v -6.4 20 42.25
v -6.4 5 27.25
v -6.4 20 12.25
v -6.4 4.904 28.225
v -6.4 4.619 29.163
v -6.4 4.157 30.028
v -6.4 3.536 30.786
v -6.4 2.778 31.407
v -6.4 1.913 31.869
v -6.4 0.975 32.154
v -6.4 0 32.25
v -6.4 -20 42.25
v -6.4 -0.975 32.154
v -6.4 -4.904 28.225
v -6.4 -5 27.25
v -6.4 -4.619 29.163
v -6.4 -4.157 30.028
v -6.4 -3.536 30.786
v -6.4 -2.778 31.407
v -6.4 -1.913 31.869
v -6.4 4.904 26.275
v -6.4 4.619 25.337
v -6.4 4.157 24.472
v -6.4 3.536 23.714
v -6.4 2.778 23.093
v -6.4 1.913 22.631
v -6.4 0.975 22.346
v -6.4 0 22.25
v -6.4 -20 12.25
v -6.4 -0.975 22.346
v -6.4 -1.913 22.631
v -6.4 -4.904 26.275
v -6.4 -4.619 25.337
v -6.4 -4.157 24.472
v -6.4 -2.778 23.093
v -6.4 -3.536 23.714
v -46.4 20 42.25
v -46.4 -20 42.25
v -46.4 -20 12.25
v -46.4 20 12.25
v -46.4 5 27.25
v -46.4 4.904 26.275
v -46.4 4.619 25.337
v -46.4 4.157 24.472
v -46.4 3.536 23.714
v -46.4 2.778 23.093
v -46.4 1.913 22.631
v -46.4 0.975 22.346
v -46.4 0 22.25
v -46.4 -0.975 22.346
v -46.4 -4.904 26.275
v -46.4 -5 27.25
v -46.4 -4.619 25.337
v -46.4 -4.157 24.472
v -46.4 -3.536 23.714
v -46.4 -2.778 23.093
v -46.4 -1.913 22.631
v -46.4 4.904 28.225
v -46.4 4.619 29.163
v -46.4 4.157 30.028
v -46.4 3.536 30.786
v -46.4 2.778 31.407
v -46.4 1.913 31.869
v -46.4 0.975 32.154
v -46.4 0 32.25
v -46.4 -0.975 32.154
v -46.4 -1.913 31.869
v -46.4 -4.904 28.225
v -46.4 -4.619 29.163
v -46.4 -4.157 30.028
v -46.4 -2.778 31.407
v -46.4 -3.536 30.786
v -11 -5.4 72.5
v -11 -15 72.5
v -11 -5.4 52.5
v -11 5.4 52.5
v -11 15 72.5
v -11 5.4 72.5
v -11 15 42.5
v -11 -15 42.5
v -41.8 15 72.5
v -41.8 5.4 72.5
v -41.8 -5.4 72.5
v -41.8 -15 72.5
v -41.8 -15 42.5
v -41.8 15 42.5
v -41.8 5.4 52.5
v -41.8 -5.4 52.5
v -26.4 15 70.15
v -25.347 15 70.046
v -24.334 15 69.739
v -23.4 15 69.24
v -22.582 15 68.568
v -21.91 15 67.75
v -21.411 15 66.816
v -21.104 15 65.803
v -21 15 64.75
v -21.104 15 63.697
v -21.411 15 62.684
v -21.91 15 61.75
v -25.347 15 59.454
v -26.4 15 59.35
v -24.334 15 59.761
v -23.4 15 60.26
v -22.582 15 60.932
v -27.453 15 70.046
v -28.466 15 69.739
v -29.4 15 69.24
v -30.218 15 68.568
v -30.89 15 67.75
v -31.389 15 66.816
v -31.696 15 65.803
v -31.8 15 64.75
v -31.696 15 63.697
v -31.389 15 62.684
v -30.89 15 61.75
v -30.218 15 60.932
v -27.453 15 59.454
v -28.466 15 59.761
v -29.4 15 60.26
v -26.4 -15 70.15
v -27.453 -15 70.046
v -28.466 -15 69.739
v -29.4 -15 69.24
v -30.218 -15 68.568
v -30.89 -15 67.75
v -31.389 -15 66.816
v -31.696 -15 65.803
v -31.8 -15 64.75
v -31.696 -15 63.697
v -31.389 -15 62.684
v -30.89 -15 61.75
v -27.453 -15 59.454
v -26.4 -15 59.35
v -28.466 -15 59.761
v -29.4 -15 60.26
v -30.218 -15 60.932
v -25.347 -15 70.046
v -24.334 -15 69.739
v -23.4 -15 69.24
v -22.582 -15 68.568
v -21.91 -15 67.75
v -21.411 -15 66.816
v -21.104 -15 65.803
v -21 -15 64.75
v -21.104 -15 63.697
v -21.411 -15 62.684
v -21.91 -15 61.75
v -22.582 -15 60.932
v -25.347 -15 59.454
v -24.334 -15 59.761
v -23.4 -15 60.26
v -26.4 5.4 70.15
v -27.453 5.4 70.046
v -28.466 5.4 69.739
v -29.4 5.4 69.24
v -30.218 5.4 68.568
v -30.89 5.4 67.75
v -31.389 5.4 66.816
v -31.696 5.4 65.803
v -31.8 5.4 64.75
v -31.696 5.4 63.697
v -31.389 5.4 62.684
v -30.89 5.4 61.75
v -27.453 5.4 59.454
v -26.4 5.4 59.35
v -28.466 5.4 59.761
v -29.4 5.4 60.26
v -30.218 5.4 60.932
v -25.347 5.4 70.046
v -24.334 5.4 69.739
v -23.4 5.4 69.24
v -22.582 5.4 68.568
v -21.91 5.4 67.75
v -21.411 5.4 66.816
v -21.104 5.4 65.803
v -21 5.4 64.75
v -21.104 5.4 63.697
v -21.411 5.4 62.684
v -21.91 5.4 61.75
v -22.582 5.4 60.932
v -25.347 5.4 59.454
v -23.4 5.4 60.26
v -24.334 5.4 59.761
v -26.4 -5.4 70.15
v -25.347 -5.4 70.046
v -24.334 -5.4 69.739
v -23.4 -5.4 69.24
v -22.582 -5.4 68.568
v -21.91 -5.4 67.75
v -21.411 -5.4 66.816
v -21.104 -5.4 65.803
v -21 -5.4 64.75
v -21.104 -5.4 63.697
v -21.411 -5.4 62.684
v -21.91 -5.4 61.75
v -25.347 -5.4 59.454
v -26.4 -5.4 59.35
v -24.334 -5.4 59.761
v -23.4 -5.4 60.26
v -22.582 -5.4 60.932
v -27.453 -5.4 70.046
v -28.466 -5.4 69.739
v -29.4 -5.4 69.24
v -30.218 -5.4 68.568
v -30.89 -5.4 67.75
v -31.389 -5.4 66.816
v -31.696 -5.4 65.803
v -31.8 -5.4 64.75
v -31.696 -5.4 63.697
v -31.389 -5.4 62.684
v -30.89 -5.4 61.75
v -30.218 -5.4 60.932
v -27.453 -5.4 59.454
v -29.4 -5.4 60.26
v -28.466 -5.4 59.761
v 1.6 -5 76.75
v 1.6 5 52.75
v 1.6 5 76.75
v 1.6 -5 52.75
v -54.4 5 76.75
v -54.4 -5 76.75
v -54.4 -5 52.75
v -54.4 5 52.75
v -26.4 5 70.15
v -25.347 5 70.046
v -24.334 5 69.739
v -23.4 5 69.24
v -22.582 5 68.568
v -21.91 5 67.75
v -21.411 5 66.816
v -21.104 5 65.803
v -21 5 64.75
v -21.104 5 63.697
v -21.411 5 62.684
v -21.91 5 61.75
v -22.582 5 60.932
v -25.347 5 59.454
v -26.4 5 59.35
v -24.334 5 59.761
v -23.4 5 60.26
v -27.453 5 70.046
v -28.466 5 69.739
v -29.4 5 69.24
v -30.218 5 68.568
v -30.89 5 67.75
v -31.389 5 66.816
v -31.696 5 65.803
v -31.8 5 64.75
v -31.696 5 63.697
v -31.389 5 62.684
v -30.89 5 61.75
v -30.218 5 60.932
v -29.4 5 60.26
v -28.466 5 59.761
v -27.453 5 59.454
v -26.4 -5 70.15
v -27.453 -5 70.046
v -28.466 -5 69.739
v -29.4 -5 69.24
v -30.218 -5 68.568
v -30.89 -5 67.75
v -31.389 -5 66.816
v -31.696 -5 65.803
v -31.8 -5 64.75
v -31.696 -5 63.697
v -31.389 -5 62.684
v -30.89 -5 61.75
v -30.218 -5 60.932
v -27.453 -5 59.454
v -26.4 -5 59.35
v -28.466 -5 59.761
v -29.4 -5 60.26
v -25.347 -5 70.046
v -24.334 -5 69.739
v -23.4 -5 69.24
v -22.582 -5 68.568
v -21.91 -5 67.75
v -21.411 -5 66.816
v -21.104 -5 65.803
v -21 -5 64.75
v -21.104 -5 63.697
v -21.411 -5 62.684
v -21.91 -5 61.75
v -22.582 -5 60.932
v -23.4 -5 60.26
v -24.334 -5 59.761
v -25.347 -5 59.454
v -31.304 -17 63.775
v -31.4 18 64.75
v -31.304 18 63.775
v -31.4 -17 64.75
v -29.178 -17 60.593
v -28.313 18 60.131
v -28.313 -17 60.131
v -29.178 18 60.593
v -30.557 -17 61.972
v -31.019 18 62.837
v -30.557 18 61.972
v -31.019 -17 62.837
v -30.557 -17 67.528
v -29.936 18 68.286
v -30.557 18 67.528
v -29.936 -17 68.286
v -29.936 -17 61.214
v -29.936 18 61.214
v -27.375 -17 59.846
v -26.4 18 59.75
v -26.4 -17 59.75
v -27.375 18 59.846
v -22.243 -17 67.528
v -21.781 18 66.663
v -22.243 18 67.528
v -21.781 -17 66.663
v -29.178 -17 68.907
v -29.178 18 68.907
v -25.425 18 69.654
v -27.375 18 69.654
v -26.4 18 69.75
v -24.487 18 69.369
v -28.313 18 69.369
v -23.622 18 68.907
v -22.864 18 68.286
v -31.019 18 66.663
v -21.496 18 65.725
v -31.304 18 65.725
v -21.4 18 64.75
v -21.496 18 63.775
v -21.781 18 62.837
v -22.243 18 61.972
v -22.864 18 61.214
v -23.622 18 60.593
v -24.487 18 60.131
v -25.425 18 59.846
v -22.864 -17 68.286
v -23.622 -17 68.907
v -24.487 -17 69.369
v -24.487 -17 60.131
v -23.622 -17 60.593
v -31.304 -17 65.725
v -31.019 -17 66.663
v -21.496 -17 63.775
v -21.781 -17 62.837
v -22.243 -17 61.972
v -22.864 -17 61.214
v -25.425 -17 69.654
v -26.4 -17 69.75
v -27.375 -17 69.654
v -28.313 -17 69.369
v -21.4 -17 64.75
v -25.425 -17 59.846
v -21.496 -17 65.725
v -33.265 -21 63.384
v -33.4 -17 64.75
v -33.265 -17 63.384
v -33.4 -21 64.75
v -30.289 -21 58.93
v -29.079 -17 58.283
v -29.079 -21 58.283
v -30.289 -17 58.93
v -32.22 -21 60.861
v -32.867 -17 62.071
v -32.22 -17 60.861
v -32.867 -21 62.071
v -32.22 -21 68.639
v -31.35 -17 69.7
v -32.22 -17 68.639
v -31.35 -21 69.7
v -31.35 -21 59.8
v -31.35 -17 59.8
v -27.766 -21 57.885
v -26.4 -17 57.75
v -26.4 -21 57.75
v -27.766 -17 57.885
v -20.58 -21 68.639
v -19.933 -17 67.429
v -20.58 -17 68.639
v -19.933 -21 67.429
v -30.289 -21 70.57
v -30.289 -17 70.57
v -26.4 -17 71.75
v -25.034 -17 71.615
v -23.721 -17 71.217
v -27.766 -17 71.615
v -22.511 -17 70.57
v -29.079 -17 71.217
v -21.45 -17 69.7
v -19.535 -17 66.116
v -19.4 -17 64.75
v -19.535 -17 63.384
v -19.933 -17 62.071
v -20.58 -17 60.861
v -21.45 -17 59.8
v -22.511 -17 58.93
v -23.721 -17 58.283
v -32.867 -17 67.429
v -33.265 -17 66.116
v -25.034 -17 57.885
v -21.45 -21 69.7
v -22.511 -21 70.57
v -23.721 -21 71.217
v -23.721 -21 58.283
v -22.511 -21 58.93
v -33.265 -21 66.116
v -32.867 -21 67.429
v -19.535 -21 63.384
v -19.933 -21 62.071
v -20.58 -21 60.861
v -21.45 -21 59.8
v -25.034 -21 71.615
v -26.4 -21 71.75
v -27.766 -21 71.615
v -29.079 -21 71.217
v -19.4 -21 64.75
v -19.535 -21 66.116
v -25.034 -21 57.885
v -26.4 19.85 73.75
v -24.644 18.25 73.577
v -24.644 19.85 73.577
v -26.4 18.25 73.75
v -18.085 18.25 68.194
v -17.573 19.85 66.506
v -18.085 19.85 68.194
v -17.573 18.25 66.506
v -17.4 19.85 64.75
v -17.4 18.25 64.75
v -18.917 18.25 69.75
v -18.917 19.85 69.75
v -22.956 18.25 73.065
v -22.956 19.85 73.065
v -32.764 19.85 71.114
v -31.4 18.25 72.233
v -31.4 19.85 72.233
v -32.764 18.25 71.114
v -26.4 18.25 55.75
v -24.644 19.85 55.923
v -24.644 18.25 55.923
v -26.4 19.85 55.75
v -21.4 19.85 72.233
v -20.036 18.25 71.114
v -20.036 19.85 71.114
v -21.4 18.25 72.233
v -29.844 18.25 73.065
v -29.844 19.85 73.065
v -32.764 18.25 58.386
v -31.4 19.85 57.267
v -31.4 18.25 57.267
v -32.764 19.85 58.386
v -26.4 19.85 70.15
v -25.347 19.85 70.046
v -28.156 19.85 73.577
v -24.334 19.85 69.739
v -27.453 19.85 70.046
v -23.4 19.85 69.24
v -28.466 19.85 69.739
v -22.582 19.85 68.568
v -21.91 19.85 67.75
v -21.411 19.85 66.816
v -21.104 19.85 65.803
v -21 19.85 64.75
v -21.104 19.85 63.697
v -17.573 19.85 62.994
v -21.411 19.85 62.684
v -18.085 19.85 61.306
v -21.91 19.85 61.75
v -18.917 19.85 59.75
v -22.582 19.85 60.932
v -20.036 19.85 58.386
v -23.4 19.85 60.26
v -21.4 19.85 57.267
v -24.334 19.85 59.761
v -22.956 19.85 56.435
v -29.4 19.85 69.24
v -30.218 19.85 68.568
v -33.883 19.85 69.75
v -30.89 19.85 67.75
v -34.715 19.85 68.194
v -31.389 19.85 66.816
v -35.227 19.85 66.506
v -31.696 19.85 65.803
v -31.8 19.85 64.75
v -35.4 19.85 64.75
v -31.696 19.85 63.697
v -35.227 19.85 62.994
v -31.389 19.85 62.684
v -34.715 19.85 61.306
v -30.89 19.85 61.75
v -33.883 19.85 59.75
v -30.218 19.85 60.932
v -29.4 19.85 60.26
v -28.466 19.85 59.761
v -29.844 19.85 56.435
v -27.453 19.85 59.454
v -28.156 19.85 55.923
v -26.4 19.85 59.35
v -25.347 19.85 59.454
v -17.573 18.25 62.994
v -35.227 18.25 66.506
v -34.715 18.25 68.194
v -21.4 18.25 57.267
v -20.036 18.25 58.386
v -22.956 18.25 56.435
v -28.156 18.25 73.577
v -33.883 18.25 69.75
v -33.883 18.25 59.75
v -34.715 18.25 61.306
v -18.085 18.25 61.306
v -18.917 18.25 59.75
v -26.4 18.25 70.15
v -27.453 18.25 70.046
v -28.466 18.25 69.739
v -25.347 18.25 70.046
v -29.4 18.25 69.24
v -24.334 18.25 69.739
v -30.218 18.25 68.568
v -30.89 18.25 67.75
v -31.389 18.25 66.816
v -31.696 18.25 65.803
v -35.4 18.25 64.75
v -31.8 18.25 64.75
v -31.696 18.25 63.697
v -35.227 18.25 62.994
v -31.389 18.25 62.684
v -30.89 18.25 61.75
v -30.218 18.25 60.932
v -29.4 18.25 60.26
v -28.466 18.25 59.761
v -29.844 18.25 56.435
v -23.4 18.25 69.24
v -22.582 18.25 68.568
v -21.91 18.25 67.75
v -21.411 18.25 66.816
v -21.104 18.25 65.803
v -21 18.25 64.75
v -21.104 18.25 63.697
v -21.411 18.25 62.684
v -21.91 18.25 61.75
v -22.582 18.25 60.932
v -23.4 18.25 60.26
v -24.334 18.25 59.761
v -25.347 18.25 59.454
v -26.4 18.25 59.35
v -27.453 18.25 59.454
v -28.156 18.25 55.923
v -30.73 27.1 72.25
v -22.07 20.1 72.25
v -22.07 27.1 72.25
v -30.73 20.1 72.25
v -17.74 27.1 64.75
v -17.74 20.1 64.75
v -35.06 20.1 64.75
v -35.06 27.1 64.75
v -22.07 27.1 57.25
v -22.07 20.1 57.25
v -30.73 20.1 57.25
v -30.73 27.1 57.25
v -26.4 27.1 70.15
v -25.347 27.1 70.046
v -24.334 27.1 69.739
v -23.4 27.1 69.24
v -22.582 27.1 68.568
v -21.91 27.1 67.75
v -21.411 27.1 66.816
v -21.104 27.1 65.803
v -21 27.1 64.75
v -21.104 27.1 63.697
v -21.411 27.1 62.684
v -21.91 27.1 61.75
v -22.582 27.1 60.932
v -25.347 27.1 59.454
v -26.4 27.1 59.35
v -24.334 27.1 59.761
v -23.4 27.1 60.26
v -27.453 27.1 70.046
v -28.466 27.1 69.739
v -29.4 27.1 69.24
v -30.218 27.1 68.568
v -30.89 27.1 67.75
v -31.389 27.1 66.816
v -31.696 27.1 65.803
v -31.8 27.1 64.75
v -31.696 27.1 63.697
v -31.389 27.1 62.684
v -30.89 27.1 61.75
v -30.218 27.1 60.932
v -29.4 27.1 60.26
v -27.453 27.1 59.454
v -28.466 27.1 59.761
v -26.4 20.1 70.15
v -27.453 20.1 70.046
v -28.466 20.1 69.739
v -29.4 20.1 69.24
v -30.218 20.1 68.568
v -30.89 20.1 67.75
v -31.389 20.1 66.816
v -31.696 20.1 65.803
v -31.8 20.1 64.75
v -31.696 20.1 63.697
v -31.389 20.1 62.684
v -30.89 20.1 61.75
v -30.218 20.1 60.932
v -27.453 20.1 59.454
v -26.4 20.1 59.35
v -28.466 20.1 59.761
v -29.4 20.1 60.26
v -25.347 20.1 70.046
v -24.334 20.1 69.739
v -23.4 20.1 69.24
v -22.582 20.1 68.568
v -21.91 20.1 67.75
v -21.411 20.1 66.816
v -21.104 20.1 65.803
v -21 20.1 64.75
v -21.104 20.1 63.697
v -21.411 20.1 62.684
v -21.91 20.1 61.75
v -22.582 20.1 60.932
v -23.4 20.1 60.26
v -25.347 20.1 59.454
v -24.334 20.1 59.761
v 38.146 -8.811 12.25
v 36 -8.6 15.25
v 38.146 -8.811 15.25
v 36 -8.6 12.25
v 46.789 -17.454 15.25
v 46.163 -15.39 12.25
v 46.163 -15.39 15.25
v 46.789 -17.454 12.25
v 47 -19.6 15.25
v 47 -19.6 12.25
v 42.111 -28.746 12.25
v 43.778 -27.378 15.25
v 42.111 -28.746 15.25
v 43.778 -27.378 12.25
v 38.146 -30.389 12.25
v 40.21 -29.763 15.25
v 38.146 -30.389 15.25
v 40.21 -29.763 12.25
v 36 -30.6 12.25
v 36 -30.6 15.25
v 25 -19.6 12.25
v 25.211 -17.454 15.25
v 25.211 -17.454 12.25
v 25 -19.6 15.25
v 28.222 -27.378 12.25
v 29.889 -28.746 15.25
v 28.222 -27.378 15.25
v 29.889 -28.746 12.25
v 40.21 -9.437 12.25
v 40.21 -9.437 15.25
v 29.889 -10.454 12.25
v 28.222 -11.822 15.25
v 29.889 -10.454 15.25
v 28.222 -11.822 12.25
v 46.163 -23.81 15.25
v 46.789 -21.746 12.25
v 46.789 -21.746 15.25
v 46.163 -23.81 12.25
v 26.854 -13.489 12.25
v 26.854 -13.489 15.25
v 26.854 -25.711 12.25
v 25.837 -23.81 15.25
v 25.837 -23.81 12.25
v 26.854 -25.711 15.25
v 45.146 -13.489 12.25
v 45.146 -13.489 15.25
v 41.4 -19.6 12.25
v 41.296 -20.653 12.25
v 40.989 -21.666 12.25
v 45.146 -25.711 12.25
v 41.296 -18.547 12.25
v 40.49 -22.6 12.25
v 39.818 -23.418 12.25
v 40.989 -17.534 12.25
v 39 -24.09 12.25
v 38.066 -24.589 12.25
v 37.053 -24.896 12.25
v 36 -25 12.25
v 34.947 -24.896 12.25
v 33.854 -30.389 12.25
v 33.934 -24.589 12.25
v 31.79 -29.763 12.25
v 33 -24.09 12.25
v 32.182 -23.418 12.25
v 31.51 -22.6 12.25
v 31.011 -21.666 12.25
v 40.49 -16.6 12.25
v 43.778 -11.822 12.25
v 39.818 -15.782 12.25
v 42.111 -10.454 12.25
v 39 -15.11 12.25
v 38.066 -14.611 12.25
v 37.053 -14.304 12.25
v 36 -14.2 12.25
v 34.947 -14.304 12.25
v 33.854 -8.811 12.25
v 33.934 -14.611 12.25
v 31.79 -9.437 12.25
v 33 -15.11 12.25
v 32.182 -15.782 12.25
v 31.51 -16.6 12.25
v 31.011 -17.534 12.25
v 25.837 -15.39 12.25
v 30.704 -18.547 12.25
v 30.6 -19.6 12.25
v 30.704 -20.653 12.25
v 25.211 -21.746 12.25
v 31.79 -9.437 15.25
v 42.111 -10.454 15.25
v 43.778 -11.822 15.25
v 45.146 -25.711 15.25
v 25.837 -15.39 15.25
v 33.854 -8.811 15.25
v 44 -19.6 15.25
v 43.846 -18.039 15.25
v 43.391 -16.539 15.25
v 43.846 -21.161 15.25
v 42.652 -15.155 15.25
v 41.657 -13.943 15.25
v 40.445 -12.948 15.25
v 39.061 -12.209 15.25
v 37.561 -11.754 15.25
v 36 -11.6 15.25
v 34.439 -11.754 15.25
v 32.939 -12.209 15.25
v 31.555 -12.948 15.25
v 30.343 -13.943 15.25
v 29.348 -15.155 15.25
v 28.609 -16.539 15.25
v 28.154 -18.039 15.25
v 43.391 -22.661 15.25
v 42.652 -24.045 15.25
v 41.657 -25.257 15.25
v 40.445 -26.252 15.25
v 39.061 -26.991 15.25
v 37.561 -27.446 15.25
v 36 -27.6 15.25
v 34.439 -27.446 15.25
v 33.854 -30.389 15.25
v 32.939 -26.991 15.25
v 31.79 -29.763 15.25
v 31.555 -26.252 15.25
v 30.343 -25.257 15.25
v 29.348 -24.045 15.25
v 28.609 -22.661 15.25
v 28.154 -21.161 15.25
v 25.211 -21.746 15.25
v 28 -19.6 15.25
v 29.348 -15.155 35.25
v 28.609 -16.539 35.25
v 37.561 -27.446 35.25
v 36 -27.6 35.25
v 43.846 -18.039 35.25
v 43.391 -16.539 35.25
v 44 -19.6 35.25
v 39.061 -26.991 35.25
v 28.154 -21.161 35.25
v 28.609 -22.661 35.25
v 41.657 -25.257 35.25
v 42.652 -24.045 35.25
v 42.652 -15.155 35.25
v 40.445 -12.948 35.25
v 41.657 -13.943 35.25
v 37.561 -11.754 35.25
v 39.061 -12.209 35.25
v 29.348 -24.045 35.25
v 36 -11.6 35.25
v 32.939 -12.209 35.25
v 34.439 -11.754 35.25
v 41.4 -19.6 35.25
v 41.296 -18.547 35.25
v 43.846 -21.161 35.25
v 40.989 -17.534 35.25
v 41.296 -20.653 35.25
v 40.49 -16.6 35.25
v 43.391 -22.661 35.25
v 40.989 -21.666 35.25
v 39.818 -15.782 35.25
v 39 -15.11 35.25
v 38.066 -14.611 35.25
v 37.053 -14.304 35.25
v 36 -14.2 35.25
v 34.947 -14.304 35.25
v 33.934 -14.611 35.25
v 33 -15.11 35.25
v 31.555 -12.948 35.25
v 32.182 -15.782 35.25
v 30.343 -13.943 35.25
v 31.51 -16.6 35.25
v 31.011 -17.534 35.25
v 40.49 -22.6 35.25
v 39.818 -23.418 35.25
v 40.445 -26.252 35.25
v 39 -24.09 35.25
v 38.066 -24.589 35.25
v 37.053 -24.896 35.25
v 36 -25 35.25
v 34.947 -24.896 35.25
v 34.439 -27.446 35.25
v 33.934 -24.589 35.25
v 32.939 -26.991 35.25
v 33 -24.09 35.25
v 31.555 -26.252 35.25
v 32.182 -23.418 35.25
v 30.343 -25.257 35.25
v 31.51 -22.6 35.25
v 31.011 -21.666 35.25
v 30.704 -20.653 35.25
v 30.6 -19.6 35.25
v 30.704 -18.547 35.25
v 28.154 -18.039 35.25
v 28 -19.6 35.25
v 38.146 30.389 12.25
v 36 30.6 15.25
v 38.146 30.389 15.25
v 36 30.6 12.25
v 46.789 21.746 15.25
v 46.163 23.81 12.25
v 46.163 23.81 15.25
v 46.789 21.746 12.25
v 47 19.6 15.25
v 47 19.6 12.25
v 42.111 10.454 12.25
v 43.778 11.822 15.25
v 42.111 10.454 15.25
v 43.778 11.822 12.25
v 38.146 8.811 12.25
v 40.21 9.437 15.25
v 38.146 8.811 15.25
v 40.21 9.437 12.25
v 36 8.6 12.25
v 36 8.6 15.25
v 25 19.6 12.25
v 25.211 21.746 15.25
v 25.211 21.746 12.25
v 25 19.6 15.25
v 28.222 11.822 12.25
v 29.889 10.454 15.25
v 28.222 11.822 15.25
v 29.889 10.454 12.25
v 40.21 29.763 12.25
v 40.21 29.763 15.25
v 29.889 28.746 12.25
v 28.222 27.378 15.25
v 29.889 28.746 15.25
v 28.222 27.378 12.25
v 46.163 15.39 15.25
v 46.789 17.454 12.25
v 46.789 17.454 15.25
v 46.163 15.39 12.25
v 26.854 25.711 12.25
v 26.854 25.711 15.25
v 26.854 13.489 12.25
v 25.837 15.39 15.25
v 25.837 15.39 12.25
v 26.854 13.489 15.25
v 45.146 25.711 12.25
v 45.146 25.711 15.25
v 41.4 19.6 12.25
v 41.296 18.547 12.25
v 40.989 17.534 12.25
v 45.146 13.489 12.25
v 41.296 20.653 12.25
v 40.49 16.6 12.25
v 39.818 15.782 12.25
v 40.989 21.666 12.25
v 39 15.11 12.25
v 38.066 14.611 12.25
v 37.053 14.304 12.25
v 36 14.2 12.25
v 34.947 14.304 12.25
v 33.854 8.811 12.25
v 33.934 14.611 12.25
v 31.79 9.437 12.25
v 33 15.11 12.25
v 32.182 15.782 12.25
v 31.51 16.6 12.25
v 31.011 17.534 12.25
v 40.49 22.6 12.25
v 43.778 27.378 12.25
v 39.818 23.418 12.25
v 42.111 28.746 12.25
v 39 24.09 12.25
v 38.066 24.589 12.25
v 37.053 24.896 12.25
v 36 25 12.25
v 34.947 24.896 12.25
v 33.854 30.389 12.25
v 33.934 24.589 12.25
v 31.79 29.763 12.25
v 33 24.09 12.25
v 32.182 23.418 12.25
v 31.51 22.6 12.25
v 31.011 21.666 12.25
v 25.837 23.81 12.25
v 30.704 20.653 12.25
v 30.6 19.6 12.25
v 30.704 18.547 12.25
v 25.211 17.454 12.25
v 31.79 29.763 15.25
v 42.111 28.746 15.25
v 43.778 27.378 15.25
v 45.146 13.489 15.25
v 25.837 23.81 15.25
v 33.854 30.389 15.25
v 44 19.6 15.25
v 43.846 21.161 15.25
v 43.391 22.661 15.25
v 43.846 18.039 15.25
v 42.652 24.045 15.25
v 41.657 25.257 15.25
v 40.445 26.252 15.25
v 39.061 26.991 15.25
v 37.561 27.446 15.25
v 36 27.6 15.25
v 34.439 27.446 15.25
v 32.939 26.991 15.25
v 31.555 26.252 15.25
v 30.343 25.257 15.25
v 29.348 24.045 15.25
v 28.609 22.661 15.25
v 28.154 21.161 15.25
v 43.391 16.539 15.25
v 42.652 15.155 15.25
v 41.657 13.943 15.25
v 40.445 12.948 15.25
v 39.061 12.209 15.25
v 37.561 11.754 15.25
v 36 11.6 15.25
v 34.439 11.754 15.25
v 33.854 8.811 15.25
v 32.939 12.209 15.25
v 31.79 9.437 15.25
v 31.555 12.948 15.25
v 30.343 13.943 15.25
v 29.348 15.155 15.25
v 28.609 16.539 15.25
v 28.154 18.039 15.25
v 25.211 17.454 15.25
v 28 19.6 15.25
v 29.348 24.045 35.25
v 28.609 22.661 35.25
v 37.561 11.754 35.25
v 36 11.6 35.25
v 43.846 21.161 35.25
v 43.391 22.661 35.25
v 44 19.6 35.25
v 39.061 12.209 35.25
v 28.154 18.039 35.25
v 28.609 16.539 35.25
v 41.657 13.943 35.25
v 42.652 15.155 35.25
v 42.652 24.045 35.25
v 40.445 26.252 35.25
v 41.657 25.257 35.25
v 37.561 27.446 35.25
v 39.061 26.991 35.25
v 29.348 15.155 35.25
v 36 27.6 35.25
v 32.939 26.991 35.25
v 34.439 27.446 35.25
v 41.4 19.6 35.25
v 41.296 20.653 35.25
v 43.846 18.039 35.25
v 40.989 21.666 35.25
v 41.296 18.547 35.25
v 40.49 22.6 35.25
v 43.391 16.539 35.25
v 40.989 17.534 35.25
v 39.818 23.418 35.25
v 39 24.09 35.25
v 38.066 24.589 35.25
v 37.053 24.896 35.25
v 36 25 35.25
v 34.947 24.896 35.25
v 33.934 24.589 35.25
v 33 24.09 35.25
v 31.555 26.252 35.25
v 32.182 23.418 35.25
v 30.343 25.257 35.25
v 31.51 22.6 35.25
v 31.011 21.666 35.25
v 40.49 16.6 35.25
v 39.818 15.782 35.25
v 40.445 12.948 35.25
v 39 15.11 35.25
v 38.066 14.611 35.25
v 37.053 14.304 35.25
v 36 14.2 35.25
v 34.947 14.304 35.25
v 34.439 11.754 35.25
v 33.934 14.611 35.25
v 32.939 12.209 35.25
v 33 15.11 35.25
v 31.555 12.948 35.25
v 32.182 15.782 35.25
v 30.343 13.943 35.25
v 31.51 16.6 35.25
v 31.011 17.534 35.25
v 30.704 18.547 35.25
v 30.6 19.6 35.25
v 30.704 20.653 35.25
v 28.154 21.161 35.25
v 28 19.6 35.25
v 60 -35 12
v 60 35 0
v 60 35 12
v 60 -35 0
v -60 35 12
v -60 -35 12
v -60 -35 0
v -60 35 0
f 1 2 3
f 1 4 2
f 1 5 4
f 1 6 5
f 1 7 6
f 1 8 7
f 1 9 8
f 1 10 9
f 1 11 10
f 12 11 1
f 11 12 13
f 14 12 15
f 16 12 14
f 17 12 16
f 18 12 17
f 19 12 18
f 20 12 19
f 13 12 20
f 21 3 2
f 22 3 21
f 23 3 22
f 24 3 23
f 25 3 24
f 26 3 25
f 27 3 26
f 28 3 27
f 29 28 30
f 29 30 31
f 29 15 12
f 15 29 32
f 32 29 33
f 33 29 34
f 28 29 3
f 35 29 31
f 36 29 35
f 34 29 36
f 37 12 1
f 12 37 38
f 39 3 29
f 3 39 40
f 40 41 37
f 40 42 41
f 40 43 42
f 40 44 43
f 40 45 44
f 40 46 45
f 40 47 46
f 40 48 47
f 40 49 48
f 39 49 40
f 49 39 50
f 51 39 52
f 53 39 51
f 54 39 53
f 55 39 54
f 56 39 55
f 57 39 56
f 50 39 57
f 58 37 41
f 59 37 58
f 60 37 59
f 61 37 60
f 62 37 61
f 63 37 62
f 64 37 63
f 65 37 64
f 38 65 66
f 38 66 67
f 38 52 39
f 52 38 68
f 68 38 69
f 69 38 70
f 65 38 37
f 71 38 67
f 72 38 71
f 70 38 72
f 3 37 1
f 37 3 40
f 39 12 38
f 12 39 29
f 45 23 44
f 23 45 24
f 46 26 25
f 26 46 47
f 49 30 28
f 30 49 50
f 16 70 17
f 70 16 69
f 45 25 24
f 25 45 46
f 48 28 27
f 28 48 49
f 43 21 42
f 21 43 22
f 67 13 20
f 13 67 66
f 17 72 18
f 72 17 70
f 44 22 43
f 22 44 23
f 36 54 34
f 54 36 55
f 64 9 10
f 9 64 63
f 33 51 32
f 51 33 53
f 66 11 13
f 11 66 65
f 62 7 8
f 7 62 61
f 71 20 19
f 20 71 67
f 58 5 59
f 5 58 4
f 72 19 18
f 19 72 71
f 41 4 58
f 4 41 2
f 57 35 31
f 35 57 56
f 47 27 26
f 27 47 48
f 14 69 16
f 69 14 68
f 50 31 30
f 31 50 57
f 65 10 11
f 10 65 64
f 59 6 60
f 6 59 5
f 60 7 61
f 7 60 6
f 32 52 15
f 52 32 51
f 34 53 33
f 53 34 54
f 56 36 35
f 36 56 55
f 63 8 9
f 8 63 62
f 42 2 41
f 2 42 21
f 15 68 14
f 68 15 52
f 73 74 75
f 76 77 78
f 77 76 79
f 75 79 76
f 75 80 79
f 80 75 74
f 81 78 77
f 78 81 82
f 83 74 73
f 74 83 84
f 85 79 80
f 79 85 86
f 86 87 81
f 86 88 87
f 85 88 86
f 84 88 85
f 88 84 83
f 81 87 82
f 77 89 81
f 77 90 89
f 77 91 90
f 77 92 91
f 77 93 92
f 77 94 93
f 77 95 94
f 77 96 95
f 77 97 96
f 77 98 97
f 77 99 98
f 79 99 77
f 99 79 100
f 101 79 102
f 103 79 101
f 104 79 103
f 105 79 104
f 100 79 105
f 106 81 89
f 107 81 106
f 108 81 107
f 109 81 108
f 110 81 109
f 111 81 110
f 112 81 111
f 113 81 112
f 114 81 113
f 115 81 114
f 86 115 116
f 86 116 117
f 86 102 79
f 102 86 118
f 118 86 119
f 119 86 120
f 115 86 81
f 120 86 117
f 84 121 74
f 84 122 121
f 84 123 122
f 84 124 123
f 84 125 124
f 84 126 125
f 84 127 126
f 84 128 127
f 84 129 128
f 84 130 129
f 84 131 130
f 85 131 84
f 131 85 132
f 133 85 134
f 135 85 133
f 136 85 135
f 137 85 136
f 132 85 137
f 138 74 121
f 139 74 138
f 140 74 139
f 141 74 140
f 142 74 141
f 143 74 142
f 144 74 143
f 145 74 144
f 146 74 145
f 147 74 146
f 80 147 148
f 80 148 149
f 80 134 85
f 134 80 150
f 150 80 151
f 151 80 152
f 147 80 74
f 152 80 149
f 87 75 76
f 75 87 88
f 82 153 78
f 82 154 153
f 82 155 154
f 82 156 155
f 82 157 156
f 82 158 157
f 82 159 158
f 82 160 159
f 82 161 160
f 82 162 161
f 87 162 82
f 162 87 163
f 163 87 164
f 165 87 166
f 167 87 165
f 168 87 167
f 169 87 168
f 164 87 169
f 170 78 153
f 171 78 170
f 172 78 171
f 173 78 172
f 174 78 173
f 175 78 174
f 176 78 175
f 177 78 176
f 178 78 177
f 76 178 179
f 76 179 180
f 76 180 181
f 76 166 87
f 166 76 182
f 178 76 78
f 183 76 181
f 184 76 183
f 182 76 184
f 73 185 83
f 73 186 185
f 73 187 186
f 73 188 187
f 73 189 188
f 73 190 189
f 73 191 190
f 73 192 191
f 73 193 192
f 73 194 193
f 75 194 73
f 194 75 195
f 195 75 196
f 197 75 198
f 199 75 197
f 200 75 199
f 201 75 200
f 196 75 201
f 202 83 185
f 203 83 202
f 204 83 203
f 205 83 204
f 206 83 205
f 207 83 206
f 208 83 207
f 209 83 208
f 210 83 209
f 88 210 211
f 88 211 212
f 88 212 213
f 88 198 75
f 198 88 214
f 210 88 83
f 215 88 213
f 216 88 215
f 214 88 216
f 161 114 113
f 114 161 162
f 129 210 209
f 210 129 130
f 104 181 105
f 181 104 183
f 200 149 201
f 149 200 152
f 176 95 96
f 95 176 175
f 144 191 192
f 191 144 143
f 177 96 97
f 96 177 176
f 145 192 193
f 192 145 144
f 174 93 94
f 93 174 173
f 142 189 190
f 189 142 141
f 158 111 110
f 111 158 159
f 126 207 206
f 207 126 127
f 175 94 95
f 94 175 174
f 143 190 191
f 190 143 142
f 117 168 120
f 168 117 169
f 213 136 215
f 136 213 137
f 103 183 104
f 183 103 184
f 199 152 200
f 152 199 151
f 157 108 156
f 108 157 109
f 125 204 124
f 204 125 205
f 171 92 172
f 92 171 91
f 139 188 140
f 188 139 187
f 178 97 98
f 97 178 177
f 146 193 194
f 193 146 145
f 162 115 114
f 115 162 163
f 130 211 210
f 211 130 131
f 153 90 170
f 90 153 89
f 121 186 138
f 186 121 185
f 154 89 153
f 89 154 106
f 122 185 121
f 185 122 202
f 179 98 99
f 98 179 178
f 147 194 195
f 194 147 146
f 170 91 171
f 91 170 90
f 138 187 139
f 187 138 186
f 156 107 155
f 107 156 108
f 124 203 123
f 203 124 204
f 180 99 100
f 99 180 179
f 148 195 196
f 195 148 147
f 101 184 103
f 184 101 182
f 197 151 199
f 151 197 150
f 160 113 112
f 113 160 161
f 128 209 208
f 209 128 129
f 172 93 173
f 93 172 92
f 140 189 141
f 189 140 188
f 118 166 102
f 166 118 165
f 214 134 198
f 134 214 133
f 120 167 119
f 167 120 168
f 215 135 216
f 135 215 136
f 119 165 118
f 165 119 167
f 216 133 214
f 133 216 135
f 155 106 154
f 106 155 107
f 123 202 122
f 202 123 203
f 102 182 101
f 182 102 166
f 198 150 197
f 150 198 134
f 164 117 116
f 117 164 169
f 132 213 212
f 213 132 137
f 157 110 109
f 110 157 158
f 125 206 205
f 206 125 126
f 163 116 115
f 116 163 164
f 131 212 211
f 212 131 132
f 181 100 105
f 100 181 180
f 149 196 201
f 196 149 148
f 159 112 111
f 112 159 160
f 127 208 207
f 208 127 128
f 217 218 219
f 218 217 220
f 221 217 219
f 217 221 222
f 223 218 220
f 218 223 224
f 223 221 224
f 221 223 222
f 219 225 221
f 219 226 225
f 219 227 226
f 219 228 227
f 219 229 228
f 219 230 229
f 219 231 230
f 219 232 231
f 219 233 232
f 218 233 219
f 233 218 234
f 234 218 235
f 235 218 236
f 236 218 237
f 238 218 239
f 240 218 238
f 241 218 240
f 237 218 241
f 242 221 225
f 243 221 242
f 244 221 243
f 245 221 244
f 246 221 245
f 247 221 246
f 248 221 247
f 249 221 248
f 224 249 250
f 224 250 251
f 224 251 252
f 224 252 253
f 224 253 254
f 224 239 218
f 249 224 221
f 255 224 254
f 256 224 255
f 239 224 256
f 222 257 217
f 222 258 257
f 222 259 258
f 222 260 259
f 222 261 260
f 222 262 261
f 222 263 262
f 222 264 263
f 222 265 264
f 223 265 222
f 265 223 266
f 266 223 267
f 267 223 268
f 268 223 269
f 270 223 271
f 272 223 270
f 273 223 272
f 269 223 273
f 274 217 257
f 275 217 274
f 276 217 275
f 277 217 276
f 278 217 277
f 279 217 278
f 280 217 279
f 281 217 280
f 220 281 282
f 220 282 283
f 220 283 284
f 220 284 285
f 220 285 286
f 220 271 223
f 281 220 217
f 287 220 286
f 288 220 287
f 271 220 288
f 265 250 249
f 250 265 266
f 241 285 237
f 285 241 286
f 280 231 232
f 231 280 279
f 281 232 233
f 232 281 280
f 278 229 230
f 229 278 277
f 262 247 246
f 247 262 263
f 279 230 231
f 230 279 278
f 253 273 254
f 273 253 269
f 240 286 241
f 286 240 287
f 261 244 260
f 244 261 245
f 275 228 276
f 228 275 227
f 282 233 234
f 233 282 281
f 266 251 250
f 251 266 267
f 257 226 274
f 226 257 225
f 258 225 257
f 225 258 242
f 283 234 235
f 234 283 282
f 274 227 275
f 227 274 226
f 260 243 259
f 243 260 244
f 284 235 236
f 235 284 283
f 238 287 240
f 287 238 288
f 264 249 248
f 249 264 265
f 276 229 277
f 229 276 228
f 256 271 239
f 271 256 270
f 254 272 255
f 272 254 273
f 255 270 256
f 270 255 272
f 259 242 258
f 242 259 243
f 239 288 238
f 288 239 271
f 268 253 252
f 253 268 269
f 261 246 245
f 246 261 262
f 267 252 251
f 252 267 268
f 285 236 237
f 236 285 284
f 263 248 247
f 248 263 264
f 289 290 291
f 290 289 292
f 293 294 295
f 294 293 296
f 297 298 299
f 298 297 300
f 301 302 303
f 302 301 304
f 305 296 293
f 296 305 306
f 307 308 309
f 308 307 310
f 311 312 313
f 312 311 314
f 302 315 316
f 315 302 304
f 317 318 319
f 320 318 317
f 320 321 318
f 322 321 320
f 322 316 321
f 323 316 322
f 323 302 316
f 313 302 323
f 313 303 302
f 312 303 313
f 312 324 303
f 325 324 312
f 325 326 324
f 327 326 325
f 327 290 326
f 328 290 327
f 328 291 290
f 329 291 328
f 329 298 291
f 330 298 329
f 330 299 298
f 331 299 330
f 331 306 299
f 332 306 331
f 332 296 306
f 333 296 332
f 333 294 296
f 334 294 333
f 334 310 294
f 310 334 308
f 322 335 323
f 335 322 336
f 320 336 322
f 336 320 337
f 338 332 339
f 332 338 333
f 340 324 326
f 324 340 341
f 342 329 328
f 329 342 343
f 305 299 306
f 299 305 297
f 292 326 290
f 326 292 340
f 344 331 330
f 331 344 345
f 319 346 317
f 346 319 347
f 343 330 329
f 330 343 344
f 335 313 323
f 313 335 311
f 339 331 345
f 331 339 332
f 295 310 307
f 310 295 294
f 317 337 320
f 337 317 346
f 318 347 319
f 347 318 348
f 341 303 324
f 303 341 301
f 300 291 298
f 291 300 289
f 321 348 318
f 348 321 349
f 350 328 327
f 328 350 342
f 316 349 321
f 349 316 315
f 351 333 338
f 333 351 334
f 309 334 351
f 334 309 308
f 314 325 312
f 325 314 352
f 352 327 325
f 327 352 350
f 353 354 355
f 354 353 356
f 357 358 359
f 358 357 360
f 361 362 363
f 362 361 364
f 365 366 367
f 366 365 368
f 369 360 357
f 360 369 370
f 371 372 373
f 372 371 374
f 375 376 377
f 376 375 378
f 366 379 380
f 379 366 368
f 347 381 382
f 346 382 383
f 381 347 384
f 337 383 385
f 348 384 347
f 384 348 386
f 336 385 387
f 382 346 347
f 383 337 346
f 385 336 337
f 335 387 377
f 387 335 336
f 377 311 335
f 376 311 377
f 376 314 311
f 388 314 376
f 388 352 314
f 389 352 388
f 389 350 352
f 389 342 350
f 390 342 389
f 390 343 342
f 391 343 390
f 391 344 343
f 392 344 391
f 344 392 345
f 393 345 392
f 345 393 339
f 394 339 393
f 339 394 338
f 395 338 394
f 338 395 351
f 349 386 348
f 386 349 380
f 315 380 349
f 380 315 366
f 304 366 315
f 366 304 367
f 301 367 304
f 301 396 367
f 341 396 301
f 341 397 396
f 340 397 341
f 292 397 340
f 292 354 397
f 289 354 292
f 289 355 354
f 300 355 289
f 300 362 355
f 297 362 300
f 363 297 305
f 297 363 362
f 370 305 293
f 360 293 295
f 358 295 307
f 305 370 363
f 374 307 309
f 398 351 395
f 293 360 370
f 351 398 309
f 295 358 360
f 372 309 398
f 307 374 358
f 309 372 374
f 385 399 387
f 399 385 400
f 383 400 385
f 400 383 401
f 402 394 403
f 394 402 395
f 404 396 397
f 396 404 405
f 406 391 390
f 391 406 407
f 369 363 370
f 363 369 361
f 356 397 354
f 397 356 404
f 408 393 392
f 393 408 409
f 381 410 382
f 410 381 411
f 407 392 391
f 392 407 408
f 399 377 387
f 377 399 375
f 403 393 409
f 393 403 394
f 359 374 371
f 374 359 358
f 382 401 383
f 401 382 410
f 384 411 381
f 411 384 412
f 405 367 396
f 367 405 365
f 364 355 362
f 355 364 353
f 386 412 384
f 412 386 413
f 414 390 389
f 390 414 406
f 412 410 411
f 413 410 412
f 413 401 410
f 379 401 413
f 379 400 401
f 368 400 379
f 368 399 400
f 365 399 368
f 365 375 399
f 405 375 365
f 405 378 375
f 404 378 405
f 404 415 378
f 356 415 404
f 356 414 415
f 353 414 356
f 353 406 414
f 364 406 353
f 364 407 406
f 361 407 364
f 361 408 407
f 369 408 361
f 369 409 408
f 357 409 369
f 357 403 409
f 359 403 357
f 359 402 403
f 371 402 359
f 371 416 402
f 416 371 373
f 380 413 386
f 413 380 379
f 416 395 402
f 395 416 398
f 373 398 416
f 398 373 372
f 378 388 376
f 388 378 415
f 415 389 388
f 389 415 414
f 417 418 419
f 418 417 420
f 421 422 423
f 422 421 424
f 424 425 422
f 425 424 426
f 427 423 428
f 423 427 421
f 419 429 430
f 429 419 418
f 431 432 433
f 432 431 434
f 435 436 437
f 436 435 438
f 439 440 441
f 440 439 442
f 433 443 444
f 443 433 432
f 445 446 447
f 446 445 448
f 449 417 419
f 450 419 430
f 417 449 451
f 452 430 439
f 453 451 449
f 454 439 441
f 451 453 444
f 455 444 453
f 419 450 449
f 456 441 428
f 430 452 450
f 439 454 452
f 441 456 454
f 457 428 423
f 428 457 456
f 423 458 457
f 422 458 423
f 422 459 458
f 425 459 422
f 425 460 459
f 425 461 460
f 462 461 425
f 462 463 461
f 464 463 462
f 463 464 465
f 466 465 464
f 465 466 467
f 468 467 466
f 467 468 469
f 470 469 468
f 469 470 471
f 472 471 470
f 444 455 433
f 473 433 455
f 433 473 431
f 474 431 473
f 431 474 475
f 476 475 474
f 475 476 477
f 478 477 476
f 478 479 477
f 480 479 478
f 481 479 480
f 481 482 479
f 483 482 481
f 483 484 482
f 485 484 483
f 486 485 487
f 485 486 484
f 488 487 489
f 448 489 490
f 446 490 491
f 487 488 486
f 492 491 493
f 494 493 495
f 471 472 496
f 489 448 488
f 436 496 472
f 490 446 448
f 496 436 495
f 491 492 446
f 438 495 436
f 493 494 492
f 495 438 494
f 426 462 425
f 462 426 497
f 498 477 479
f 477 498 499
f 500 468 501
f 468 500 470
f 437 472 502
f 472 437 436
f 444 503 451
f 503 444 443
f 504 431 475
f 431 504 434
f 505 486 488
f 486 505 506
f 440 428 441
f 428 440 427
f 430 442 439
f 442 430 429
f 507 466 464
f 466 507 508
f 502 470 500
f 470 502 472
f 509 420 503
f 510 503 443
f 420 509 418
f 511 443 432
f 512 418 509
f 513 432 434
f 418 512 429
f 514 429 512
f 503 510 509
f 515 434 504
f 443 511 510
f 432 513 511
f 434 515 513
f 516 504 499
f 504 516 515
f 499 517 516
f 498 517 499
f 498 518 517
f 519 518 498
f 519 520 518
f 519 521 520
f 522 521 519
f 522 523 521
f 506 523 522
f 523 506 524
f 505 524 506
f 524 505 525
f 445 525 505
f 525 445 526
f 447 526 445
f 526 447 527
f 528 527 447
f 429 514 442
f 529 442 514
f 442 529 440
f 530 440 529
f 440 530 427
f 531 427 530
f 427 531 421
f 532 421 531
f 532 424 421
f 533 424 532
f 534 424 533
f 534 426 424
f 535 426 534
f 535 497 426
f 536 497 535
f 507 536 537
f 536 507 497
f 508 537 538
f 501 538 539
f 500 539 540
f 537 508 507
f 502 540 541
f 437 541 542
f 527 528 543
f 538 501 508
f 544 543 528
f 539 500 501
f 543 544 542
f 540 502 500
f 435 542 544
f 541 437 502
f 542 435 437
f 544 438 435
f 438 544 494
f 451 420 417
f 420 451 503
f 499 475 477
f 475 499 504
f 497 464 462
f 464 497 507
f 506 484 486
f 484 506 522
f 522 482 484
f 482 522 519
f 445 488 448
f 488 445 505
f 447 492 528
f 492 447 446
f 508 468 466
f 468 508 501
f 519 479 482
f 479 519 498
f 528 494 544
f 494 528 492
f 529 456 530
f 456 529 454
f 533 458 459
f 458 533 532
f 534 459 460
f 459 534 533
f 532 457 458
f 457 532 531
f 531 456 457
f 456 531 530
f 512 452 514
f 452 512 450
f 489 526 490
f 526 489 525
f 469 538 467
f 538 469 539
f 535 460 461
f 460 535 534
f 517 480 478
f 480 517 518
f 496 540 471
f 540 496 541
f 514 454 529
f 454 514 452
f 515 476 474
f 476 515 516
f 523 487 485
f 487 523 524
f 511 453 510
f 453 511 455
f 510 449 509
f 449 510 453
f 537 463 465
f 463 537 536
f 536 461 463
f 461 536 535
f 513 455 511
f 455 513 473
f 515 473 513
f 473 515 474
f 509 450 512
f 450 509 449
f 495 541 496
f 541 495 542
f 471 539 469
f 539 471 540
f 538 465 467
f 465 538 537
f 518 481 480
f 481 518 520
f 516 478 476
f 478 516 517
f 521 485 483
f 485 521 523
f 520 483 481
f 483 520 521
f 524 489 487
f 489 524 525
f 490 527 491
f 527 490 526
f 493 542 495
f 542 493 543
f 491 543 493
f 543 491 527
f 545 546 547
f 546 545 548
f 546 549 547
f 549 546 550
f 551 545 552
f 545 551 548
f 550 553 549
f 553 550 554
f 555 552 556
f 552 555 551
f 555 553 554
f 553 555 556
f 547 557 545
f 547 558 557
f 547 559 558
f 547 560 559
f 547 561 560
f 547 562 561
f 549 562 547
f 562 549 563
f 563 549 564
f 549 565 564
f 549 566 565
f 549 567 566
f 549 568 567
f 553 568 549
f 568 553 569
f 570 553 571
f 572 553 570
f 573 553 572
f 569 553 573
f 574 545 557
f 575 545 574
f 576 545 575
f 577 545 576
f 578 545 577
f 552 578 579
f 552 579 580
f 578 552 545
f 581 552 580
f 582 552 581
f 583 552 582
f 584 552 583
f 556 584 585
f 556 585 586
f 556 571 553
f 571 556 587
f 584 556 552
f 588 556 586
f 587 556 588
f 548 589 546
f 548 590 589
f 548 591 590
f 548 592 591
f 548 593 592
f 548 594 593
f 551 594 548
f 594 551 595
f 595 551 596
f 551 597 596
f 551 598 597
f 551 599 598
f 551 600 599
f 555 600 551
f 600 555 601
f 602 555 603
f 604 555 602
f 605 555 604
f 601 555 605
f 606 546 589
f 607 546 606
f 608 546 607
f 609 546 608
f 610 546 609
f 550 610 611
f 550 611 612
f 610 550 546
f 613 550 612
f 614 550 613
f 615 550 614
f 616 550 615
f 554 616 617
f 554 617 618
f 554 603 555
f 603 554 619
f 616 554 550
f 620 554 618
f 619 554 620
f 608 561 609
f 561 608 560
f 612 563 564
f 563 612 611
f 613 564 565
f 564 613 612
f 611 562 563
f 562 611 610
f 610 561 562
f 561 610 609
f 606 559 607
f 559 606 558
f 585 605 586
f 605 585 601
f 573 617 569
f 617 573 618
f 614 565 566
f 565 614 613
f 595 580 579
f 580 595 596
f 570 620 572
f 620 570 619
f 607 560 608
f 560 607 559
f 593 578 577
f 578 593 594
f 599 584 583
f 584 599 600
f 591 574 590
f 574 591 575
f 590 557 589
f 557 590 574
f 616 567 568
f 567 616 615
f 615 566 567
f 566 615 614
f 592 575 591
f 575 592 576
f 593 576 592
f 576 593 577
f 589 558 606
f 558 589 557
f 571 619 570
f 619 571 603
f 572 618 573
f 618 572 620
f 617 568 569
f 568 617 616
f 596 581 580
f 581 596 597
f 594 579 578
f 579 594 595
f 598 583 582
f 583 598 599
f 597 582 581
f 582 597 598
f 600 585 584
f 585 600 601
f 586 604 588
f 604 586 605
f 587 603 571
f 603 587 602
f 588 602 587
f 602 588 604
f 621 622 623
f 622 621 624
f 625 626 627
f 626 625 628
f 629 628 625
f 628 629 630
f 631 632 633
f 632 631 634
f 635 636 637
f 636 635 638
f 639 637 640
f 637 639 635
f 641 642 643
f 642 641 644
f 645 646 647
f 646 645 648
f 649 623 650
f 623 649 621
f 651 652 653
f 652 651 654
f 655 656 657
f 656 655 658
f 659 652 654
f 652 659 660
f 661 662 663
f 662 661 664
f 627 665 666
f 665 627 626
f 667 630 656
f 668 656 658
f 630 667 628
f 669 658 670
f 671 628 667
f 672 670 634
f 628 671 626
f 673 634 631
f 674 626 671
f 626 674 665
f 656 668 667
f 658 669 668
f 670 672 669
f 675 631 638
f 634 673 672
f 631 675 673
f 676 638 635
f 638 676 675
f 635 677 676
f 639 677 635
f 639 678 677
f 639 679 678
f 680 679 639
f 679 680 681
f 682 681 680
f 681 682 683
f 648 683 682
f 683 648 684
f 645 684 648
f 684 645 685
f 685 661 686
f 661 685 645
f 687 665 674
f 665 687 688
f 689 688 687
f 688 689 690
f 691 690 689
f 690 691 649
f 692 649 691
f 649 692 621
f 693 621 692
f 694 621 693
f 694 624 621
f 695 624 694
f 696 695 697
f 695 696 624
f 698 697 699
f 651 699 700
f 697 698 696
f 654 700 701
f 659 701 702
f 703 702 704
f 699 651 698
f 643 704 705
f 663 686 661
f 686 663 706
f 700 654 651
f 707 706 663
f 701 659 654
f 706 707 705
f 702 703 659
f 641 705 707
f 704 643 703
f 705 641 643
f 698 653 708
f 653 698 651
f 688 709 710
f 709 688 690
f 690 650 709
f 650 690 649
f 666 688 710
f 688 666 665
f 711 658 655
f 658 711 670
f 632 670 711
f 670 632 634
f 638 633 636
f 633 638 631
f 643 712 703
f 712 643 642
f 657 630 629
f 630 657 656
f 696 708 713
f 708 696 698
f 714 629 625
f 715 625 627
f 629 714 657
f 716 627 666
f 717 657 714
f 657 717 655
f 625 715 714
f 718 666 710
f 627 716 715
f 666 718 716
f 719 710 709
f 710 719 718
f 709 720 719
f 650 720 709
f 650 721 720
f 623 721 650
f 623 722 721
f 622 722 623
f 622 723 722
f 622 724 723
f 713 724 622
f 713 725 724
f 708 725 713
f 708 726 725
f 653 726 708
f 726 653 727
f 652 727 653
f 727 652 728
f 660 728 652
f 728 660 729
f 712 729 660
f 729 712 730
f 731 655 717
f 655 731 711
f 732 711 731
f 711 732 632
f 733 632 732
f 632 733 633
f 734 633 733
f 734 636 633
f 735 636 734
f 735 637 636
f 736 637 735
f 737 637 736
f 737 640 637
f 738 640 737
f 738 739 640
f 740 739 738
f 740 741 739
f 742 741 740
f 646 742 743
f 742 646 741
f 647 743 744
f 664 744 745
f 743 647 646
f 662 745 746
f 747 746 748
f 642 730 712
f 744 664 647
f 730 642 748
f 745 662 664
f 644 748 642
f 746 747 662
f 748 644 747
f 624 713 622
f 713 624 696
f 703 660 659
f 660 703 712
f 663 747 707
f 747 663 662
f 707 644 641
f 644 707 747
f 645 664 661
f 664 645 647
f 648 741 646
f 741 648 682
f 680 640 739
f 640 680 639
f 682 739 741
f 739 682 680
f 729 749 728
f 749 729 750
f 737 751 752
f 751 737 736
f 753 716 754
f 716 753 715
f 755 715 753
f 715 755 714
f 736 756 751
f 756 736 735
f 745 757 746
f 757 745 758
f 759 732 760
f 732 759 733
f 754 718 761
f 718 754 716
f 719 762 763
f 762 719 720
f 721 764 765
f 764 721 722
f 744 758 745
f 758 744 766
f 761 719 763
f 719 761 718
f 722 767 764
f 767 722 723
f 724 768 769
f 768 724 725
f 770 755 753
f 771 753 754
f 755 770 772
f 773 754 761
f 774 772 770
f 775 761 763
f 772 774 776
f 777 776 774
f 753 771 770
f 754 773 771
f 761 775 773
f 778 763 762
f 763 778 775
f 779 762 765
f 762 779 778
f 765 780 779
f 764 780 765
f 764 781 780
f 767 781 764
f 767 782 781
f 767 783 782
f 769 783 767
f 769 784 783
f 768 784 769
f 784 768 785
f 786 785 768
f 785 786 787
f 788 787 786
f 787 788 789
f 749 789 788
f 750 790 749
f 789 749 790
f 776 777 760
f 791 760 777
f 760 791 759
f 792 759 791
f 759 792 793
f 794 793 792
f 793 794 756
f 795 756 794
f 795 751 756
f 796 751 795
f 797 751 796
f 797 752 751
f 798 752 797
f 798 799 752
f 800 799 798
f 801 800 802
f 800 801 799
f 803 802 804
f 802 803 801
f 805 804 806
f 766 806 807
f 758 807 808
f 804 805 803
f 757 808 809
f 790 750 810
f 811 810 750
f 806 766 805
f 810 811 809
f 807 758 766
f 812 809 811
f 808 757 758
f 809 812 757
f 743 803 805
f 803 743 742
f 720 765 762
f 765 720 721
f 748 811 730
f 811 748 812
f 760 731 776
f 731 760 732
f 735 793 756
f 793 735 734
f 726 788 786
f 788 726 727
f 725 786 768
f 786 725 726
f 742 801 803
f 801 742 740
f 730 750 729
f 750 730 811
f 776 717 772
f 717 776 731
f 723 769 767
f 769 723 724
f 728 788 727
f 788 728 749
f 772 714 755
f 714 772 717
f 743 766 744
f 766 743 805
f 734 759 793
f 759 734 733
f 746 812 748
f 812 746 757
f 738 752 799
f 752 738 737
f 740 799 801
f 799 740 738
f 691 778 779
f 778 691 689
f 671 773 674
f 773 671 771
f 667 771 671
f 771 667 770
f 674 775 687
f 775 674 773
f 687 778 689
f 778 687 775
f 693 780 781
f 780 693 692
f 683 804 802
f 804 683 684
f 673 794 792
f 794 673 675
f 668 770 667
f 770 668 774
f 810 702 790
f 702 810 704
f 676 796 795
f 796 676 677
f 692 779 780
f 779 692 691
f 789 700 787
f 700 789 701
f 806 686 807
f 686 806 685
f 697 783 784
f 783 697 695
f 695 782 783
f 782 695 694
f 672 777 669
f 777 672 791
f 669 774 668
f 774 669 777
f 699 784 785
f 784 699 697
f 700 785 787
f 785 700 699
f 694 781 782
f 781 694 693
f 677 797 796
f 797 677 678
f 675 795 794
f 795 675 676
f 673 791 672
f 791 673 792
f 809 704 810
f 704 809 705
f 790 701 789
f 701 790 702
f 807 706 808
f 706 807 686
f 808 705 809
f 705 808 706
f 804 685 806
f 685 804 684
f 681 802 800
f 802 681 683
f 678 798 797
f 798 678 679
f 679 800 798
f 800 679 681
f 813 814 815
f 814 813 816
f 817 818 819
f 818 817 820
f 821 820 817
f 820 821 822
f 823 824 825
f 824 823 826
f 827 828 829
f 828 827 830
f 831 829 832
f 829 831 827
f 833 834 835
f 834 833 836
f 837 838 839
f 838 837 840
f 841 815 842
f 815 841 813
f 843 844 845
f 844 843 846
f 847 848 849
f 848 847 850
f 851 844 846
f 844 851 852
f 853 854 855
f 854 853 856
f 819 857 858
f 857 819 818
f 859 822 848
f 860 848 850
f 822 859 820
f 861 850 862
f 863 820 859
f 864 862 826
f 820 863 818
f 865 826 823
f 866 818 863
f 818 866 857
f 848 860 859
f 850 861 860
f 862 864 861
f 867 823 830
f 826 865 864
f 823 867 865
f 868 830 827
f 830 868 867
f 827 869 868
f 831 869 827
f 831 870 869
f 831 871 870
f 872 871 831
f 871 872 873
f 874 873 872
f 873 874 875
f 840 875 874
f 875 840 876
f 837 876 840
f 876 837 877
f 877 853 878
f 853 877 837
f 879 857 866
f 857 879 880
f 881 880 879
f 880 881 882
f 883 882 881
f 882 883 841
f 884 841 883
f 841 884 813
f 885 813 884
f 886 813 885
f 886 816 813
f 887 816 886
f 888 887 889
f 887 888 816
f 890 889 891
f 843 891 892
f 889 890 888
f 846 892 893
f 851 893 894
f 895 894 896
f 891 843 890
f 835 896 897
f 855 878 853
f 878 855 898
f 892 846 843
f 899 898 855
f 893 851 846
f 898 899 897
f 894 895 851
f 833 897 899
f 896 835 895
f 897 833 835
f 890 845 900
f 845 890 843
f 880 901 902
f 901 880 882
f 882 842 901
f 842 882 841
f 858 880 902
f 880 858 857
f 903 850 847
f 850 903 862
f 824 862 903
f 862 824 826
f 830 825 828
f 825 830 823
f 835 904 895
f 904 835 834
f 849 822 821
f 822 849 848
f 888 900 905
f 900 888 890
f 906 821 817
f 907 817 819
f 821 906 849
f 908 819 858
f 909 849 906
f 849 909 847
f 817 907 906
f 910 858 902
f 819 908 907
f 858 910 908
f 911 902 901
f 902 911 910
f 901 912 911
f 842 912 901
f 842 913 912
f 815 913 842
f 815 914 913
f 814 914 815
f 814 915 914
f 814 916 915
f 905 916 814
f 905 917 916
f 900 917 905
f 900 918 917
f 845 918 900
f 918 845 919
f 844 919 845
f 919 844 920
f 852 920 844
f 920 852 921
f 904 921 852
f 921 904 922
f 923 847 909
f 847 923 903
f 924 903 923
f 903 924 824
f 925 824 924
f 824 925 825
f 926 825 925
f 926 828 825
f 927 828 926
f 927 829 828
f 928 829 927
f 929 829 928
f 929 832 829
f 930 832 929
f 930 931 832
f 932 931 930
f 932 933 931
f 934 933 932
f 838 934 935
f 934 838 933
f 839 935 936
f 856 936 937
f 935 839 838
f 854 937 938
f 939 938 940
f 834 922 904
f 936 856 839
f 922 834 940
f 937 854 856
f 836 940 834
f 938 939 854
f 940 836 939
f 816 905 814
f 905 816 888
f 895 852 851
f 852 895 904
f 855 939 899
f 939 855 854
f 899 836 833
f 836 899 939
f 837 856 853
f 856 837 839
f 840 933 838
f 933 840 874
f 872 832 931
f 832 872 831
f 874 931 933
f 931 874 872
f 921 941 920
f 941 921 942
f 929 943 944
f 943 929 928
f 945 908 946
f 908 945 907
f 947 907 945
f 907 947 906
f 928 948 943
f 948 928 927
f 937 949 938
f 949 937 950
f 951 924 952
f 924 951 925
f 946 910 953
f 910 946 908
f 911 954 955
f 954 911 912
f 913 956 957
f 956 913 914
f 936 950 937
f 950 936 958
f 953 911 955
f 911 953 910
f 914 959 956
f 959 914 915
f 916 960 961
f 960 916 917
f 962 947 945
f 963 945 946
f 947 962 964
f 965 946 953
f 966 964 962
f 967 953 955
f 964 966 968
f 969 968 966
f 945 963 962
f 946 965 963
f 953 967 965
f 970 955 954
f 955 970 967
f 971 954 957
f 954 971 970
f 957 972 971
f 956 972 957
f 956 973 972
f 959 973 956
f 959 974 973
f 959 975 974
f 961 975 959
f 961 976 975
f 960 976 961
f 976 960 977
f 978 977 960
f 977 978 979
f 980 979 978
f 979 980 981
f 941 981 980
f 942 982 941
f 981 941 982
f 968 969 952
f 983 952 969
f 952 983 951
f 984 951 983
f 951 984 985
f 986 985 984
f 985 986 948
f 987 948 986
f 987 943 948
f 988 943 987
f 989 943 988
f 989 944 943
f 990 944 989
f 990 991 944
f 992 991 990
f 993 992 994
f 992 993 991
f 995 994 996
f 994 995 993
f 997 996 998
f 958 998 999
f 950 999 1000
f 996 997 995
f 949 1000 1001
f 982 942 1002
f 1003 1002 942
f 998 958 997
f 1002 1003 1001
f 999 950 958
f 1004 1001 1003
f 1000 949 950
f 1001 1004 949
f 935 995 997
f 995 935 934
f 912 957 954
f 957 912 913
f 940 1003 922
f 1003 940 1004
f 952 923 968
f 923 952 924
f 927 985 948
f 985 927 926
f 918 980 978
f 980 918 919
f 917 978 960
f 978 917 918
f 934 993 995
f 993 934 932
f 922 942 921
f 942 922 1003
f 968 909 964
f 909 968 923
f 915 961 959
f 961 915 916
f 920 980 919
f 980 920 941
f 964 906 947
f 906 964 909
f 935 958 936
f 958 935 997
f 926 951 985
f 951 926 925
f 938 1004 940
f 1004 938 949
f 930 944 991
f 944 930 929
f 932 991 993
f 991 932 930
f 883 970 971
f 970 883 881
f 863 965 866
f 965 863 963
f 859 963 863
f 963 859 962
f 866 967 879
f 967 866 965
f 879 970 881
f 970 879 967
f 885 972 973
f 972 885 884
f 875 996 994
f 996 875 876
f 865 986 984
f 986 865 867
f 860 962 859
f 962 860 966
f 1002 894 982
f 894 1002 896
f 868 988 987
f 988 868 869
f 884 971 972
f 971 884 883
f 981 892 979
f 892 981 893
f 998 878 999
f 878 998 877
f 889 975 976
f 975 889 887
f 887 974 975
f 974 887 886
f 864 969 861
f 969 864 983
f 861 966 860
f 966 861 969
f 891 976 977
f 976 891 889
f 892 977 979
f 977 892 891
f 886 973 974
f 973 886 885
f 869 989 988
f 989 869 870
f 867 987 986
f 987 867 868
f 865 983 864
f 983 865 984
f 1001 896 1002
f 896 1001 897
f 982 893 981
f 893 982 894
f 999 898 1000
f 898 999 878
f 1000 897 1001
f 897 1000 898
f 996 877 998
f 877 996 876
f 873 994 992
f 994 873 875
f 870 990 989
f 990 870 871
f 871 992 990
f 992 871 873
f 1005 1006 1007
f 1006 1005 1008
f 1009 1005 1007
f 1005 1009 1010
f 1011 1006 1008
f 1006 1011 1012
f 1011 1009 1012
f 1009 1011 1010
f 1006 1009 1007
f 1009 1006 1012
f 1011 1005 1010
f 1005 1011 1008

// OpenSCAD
$fn = 32;

// ------------------------------------------------------------------------
// Indexing jig: plate 120 x 70 mm, pin d10
// Every part is its own module, assembly() places every instance.
// ------------------------------------------------------------------------

// --- part 1 ---
module jig_plate() {
  difference() {
    translate([-60, -35, 0]) cube([120, 70, 12]);
  }
}

// --- part 2 ---
module locator_block() {
  difference() {
    translate([-20, -20, 0]) cube([40, 40, 30]);
    translate([0, 0, 15]) rotate([0, 90, 0]) cylinder(h = 42, d = 10, center = true);
  }
}

// --- part 3 ---
module index_fork() {
  difference() {
    translate([-15.4, -15, 0]) cube([30.8, 30, 30]);
    translate([-16.4, -5.4, 10]) cube([32.8, 10.8, 21]);
    translate([0, 0, 22.25]) rotate([90, 0, 0]) cylinder(h = 32, d = 10.8, center = true);
  }
}

// --- part 4 ---
module index_arm() {
  difference() {
    translate([-28, -5, 0]) cube([56, 10, 24]);
    translate([0, 0, 12]) rotate([90, 0, 0]) cylinder(h = 12, d = 10.8, center = true);
  }
}

// --- part 5 ---
module index_pin() {
  rotate([0, 90, 0]) cylinder(h = 36, d = 10, center = true);
  translate([-21, 0, 0]) rotate([0, 90, 0]) cylinder(h = 4, d = 14);
}

// --- part 6 ---
module pin_washer() {
  difference() {
      translate([0, 0, 0]) cylinder(h = 1.6, d = 18);
      translate([0, 0, -1]) cylinder(h = 3.6, d = 10.8);
    }
}

// --- part 7 ---
module lock_nut() {
  difference() {
    linear_extrude(height = 7) polygon(points = [[8.66, 0], [4.33, 7.5], [-4.33, 7.5], [-8.66, 0], [-4.33, -7.5], [4.33, -7.5]]);
    translate([0, 0, -1]) cylinder(h = 9, d = 10.8);
  }
}

// --- part 8 ---
module guide_bush_a() {
  difference() {
    union() {
      cylinder(h = 3, d = 22);
      translate([0, 0, 3]) cylinder(h = 20, d = 16);
    }
    translate([0, 0, -1]) cylinder(h = 25, d = 10.8);
  }
}

// --- part 9 ---
module guide_bush_b() {
  difference() {
    union() {
      cylinder(h = 3, d = 22);
      translate([0, 0, 3]) cylinder(h = 20, d = 16);
    }
    translate([0, 0, -1]) cylinder(h = 25, d = 10.8);
  }
}

// --- assembly ---
module assembly() {
  color([0.80, 0.24, 0.20]) translate([0, 0, 0]) rotate([0, 0, 0]) jig_plate();
  color([0.20, 0.45, 0.75]) translate([-26.4, 0, 12.25]) rotate([0, 0, 0]) locator_block();
  color([0.25, 0.62, 0.32]) translate([-26.4, 0, 42.5]) rotate([0, 0, 0]) index_fork();
  color([0.92, 0.70, 0.18]) translate([-26.4, 0, 52.75]) rotate([0, 0, 0]) index_arm();
  color([0.58, 0.35, 0.70]) translate([-26.4, 0, 64.75]) rotate([0, 0, 90]) index_pin();
  color([0.16, 0.66, 0.66]) translate([-26.4, 19.85, 64.75]) rotate([90, 0, 0]) pin_washer();
  color([0.85, 0.48, 0.18]) translate([-26.4, 27.1, 64.75]) rotate([90, 0, 0]) lock_nut();
  color([0.55, 0.60, 0.65]) translate([36, -19.6, 12.25]) rotate([0, 0, 0]) guide_bush_a();
  color([0.75, 0.30, 0.55]) translate([36, 19.6, 12.25]) rotate([0, 0, 0]) guide_bush_b();
}

assembly();
